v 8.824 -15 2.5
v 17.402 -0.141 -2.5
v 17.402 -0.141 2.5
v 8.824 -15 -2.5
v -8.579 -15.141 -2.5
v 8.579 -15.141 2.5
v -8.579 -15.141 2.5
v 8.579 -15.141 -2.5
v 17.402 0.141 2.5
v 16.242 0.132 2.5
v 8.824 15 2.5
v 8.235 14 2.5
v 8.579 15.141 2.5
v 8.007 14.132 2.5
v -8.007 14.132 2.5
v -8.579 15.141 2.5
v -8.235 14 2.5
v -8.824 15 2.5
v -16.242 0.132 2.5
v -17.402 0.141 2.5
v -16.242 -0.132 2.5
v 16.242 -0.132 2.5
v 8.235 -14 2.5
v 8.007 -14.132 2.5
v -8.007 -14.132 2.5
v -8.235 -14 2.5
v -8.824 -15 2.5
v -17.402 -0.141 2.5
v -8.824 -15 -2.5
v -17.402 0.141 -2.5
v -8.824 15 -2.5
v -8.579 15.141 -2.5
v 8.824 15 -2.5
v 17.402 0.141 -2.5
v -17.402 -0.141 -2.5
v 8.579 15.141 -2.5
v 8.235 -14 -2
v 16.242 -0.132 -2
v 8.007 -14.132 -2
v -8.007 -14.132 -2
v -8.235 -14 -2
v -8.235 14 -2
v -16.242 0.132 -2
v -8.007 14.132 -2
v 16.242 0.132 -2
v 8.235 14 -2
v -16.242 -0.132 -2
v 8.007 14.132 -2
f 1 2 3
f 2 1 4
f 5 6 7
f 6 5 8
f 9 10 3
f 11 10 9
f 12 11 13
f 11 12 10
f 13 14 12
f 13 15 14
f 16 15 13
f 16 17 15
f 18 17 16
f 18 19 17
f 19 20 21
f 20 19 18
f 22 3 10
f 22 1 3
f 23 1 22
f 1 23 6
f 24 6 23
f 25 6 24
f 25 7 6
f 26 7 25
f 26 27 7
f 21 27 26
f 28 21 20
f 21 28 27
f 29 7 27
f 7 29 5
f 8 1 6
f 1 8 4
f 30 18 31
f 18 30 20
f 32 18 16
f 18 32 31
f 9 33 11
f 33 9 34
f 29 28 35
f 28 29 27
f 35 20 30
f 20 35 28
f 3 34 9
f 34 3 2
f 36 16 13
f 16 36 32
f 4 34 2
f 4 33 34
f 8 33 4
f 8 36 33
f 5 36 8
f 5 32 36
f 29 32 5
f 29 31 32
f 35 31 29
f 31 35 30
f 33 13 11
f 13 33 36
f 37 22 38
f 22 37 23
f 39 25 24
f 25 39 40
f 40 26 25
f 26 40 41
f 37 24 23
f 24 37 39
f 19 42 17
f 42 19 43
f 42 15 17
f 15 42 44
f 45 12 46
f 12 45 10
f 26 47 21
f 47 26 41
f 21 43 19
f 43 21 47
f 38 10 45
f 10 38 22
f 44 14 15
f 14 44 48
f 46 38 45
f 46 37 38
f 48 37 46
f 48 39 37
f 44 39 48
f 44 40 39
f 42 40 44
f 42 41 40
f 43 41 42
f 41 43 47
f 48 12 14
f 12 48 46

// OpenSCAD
//---------------------------
// Réalisation hexagone
//---------------------------
$fn = 64;

//phex(10,0.1,10);
difference() {
    fhex(30,5);
    translate ([0,0,2]) fhex(28,8);
}

module phex(wid,rad,height){
hull(){
translate([wid/2-rad,0,0])cylinder(r=rad,h=height);
rotate([0,0,60])translate([wid/2-rad,0,0])cylinder(r=rad,h=height);
rotate([0,0,120])translate([wid/2-rad,0,0])cylinder(r=rad,h=height);
rotate([0,0,180])translate([wid/2-rad,0,0])cylinder(r=rad,h=height);
rotate([0,0,240])translate([wid/2-rad,0,0])cylinder(r=rad,h=height);
rotate([0,0,300])translate([wid/2-rad,0,0])cylinder(r=rad,h=height);

}
}

module fhex(wid,height){
hull(){
cube([wid/1.7,wid,height],center = true);
rotate([0,0,120])cube([wid/1.7,wid,height],center = true);
rotate([0,0,240])cube([wid/1.7,wid,height],center = true);
}
}
